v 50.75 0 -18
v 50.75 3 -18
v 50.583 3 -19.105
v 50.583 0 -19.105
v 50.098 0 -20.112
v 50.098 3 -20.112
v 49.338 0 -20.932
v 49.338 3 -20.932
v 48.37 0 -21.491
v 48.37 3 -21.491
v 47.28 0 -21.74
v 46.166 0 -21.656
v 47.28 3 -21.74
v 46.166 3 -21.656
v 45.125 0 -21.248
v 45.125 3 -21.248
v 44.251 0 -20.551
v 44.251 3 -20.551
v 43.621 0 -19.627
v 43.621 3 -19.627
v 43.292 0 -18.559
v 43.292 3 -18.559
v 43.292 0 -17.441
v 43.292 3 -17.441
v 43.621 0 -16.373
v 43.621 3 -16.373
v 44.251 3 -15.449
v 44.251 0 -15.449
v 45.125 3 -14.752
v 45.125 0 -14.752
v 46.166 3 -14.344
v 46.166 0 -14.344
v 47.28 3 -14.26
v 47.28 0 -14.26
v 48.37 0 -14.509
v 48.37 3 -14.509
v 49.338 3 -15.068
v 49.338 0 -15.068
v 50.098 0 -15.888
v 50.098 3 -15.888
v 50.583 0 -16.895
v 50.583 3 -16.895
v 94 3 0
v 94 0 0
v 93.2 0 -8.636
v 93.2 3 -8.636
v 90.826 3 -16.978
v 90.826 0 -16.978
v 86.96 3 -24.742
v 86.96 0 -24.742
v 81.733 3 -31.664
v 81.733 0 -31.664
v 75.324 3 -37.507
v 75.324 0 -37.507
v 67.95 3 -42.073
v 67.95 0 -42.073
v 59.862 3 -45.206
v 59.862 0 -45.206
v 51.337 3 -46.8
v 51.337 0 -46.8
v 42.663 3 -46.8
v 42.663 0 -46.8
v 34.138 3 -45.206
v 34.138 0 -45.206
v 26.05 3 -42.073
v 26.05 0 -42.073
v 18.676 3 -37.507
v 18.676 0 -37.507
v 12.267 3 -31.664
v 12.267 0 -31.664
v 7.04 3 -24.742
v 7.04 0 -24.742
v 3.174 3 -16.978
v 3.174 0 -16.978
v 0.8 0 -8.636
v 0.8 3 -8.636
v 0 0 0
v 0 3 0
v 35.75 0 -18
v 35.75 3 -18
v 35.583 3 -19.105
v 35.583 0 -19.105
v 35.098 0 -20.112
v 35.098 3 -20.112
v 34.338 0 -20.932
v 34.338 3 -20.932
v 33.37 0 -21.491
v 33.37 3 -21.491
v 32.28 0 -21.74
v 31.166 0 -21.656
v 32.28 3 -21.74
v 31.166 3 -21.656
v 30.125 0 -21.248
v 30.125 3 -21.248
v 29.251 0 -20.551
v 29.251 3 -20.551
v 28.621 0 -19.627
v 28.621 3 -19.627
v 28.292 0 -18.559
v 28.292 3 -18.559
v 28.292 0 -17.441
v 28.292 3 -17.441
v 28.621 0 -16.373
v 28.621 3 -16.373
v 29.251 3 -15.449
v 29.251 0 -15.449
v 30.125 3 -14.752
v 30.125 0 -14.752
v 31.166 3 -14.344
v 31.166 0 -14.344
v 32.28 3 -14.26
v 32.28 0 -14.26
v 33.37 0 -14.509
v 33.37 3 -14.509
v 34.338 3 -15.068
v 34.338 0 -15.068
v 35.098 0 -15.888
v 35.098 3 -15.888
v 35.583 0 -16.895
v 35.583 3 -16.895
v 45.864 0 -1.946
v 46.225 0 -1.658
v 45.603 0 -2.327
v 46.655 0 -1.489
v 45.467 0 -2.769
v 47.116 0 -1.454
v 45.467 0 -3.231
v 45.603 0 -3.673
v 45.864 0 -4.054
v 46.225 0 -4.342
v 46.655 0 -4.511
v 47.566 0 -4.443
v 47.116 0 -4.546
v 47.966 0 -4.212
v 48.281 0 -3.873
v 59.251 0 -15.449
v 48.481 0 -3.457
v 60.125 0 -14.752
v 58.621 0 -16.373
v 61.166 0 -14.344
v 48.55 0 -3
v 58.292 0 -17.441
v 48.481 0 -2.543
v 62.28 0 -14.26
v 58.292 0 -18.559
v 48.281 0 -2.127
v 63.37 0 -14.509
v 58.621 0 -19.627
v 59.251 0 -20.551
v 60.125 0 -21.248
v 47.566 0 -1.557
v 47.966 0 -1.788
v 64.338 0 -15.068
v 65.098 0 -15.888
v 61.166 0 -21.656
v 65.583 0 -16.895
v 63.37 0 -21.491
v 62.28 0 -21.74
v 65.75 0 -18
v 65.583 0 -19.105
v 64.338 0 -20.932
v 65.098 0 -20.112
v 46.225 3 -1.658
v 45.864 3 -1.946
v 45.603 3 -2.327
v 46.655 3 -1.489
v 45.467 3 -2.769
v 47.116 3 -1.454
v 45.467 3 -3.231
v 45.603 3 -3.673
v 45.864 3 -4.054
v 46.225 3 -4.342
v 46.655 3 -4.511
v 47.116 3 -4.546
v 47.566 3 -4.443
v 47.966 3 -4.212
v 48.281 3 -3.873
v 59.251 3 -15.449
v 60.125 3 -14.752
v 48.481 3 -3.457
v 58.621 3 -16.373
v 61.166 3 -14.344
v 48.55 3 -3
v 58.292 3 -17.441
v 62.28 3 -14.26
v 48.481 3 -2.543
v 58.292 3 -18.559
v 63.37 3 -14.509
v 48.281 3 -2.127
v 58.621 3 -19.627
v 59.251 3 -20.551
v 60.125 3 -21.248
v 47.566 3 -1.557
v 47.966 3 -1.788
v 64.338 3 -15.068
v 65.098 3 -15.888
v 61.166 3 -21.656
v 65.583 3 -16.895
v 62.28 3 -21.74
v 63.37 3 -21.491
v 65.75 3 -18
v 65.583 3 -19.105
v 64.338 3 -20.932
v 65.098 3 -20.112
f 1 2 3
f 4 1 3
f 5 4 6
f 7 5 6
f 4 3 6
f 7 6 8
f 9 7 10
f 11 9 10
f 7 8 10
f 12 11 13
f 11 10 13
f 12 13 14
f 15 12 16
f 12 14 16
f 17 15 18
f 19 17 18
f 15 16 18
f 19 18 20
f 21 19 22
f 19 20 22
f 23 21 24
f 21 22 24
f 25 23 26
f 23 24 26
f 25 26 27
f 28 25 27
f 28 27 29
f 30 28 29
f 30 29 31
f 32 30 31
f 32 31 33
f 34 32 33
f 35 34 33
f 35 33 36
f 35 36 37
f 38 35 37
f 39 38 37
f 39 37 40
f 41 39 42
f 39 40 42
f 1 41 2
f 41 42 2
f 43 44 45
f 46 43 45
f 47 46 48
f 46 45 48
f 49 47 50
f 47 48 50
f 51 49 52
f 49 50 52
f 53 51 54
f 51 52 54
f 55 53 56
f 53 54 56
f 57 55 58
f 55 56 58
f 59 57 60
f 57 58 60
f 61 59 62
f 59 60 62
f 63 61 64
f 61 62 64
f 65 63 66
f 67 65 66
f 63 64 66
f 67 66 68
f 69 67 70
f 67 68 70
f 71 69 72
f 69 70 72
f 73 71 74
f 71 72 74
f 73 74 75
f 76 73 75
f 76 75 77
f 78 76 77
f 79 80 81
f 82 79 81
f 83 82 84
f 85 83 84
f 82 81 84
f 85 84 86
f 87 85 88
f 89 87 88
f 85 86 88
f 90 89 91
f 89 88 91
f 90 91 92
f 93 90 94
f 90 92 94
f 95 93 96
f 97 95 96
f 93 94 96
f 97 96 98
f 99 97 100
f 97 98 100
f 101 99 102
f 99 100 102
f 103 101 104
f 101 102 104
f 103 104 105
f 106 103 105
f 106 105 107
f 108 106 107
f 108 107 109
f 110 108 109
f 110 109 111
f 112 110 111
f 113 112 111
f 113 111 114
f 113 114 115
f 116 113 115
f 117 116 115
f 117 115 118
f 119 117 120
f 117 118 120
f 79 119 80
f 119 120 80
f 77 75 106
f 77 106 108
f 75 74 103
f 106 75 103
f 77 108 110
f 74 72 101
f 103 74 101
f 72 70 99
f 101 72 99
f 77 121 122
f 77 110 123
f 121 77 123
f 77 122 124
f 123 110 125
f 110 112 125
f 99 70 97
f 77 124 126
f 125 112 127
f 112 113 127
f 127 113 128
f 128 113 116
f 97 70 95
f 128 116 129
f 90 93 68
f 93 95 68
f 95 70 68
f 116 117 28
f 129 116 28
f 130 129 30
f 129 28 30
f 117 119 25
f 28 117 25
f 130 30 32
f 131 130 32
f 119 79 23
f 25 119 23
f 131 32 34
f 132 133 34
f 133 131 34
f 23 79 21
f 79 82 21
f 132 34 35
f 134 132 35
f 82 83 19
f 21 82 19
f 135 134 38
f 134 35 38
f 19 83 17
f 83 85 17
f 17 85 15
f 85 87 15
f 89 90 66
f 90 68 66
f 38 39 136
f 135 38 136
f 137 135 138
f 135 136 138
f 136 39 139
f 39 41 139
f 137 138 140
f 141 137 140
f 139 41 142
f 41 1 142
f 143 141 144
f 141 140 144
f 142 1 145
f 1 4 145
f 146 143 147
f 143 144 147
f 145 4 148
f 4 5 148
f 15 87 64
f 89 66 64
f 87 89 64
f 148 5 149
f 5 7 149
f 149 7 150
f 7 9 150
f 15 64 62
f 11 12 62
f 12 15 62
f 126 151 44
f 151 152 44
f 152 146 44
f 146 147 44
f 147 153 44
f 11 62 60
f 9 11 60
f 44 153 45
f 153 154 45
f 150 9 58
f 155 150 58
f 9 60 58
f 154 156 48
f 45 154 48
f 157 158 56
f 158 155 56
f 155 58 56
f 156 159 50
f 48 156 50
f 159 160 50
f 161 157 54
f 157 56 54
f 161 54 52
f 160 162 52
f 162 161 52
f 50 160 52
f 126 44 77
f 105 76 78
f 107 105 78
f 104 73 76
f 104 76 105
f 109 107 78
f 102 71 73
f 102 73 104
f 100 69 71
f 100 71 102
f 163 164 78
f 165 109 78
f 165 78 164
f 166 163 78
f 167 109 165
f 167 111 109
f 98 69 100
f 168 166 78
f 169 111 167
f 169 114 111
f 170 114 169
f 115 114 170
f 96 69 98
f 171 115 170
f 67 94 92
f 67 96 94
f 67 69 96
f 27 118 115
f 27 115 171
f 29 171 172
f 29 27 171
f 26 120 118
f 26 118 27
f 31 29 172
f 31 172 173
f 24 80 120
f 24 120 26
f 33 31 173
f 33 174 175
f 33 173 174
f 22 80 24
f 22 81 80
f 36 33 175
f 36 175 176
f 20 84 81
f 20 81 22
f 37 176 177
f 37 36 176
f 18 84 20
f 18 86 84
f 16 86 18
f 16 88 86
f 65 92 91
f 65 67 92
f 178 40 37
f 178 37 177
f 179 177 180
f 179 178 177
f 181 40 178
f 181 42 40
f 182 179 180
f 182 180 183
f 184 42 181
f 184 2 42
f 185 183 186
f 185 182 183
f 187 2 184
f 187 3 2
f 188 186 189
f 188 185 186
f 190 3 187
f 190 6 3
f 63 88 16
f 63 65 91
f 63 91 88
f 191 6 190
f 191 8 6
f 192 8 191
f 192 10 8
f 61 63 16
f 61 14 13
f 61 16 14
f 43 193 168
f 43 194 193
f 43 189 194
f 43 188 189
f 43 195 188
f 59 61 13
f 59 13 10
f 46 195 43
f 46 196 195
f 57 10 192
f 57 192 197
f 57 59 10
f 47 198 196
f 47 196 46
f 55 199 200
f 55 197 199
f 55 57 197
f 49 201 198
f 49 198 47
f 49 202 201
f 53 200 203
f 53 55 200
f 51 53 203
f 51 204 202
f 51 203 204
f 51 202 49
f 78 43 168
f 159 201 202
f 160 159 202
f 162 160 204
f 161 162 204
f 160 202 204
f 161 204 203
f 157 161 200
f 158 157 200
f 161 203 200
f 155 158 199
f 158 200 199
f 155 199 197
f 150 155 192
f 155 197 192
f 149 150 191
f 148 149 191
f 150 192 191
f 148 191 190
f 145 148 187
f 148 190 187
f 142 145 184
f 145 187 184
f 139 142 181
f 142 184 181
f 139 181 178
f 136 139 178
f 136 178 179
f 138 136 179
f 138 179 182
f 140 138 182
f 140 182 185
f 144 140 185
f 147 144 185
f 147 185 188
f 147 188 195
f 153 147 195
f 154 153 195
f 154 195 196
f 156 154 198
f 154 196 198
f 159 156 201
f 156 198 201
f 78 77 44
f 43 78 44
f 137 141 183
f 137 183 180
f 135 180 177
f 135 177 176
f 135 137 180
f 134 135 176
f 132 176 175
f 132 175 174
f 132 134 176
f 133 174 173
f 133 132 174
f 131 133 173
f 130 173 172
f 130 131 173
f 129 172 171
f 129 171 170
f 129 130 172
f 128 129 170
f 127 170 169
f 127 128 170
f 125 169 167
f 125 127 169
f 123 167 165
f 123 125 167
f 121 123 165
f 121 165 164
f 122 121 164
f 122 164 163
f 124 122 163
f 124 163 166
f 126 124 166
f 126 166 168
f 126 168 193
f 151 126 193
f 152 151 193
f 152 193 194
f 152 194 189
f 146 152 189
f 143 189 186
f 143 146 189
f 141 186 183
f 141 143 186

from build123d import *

# Parameters (mm, degrees)
SKETCH1_R           = 1.55
BOSS_EXTRUDE1_DEPTH = 3
SKETCH2_R           = 3.75
CUT_EXTRUDE1_DEPTH  = 3


with BuildPart() as part:
    # Sketch1 → Boss-Extrude1 (new body)
    with BuildSketch(Plane(origin=(0, 0, 0), x_dir=(1, 0, 0), z_dir=(0, 1, 0))):
        with BuildLine():
            Line((0, 0), (94, 0))
            ThreePointArc((94, 0), (47, 47), (0, 0))
        make_face()
        with Locations((47, 3)):
            Circle(SKETCH1_R, mode=Mode.SUBTRACT)
    extrude(amount=BOSS_EXTRUDE1_DEPTH)

    # Sketch2 → Cut-Extrude1 (cut)
    with BuildSketch(Plane(origin=(0, 3, 0), x_dir=(1, 0, 0), z_dir=(0, 1, 0))):
        with Locations((47, 18)):
            Circle(SKETCH2_R)
        with Locations((32, 18)):
            Circle(SKETCH2_R)
        with Locations((62, 18)):
            Circle(SKETCH2_R)
    extrude(amount=-CUT_EXTRUDE1_DEPTH, mode=Mode.SUBTRACT)


solid = part.part
